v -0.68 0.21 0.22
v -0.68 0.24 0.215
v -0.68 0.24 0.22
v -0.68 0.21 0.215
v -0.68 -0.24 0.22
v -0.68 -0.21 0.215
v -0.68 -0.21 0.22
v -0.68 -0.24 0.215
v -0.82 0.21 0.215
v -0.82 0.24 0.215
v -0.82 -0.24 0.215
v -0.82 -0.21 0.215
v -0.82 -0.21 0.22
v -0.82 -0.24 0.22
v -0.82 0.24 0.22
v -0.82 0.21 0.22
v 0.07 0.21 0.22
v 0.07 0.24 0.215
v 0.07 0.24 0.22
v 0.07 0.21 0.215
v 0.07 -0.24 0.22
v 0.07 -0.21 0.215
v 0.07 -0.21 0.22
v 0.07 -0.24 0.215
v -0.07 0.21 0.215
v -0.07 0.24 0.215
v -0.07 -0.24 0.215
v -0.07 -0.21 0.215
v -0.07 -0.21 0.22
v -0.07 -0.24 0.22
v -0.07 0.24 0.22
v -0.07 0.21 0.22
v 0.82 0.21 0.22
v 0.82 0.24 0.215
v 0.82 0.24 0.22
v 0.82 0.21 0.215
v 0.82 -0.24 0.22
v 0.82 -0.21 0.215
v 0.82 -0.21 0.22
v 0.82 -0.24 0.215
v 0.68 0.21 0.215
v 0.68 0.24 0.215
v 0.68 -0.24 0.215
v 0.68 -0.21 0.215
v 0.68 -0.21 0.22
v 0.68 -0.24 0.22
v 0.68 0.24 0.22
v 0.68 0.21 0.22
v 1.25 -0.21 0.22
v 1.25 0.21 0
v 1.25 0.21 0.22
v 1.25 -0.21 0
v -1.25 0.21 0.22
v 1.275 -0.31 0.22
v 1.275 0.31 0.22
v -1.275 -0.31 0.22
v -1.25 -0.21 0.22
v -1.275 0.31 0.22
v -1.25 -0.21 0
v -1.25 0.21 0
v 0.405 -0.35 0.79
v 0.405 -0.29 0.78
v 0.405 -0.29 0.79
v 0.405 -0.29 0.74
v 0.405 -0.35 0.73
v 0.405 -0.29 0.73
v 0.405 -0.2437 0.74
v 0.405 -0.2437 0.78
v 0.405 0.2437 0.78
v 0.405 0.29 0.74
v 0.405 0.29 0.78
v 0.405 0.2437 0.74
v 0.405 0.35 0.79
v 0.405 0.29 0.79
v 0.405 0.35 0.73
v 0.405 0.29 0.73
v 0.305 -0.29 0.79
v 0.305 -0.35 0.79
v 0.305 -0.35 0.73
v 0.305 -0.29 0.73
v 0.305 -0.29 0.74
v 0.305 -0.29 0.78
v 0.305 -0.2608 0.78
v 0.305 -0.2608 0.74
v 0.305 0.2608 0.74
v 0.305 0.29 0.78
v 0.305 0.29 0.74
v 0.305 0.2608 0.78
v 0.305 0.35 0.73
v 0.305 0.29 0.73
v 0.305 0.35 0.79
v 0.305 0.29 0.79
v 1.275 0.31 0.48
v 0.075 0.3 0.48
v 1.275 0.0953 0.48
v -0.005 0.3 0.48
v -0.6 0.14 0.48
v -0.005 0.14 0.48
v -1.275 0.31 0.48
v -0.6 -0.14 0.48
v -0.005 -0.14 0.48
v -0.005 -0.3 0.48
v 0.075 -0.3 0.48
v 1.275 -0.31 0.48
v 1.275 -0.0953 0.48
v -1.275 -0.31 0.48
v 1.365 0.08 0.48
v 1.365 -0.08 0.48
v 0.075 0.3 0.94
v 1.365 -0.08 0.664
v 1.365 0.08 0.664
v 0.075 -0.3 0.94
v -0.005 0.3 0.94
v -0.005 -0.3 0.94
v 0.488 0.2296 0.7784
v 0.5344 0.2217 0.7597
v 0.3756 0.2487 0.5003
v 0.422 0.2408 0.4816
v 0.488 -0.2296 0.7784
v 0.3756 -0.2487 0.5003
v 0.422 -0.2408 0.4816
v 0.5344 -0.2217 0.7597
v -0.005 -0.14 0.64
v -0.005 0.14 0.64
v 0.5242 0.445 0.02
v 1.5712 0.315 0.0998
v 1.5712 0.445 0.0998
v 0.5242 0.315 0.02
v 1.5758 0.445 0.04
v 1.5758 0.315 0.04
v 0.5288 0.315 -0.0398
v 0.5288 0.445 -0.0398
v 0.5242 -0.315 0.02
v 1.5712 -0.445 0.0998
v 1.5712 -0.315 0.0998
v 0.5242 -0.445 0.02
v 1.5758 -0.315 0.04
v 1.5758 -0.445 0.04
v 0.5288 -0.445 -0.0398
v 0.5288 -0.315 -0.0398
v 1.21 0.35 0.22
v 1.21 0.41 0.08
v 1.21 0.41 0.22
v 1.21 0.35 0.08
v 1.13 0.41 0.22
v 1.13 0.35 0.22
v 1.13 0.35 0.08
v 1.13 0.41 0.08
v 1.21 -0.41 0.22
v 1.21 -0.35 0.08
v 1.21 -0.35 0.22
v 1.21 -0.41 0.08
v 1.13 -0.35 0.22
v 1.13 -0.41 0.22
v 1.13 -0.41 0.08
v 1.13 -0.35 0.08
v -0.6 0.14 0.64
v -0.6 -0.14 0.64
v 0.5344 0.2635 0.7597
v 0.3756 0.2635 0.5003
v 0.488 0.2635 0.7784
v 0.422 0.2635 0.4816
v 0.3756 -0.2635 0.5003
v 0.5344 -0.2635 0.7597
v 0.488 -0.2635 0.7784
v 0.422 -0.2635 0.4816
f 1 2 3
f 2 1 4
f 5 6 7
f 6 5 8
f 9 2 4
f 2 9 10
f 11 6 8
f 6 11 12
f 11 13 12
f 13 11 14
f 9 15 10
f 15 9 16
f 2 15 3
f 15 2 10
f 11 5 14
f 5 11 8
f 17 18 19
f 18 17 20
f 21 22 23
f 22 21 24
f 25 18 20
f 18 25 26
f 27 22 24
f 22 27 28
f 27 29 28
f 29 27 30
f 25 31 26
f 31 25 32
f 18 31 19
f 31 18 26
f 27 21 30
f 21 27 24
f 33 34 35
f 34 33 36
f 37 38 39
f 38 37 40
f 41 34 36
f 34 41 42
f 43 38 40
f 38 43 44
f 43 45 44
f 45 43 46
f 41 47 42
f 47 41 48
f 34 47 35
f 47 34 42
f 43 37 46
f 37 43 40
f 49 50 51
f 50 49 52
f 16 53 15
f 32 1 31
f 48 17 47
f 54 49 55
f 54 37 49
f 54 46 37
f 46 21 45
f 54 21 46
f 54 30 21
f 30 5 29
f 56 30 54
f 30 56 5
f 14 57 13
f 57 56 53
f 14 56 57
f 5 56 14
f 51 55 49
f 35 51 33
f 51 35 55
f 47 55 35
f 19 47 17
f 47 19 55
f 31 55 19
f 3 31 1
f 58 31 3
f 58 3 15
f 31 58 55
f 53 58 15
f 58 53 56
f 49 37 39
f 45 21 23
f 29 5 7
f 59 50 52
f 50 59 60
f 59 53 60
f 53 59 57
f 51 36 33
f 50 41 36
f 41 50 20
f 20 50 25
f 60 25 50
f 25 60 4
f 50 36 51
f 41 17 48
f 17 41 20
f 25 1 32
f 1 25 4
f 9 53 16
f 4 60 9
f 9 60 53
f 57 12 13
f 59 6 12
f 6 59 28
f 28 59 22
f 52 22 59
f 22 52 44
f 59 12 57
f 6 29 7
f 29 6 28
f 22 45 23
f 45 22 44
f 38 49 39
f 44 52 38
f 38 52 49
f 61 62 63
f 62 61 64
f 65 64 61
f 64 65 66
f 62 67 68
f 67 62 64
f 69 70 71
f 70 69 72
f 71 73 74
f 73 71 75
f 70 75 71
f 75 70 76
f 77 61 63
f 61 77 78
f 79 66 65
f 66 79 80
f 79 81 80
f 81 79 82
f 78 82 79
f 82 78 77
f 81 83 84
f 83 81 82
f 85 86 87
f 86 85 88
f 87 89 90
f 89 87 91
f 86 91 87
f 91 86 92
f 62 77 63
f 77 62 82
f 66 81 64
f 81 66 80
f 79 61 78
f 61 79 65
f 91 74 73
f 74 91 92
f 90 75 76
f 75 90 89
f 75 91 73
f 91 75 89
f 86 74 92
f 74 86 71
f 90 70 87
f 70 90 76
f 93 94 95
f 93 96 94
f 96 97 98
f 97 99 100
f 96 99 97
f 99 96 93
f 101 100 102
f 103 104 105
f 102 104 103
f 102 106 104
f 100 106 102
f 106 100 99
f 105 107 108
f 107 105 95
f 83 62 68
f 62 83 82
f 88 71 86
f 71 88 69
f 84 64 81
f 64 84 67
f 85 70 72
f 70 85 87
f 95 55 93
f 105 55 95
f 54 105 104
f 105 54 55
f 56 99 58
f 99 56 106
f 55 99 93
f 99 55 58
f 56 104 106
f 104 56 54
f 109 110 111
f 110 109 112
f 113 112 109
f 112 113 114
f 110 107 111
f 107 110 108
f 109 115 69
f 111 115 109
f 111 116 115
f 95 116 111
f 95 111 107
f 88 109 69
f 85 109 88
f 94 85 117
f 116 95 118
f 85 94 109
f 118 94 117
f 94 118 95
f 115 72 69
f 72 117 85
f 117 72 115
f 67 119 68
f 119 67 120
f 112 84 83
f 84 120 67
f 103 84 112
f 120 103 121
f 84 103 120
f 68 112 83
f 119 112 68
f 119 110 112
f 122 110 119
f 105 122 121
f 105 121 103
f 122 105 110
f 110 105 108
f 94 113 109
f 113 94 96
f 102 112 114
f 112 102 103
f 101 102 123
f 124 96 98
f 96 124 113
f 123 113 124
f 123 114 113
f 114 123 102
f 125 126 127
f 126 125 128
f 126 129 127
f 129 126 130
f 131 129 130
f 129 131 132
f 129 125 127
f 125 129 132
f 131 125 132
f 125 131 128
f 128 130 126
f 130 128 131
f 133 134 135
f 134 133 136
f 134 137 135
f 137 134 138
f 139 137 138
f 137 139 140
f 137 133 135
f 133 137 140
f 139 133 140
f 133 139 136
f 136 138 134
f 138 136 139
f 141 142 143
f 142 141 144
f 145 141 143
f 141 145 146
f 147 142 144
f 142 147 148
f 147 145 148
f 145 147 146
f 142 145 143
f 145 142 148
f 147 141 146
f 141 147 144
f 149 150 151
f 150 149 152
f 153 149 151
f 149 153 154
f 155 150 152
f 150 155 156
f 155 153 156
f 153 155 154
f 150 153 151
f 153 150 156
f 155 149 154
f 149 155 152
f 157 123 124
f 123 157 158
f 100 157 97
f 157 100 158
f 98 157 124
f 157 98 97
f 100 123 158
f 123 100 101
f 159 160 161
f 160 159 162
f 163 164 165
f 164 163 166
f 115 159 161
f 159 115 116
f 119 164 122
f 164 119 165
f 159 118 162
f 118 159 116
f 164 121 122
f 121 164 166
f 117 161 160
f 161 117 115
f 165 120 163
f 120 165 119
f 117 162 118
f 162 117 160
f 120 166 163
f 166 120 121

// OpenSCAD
// Snowmobile — ski-patrol rescue sled.
// A compact personal over-snow vehicle: single centred rear track, two
// front steering skis, a tapered hood over the engine, a seat, and
// handlebars. Much narrower and shorter than the snowcat.
//
// Real specs (Arctic Cat / Ski-Doo touring class):
//   length ~2.9 m  ·  width ~0.70 m  ·  height ~1.1 m to bar tops
//
// Body colours are near-white so the renderer's per-instance ColorTint
// controls the appearance cleanly: white tint = parked, red tint = active.
//
// Origin at the centre of the footprint on Z=0. +X is forward.
// Conventions, units, and axis docs: see models-src/README.md.

$fn = 8;

// ── Dimensions (metres) ───────────────────────────────────────────────────

// Rear track — single centred belt
track_l = 2.50;
track_w = 0.42;
track_h = 0.22;

// Chassis / tunnel that everything mounts to
chassis_l = 2.55;
chassis_w = 0.62;
chassis_h = 0.26;

// Hood — tapers from the firewall (where chassis meets engine bay) to nose tip
hood_l      = 1.20; // measured forward from the firewall
hood_w_back = 0.60; // width at the firewall (matches chassis width)
hood_w_nose = 0.16; // width at the nose tip
hood_h      = 0.46; // hood height above chassis top

// Front skis — two wide-set steering skis; their centres live fore of
// the chassis nose so the tips visibly extend forward.
ski_l        = 1.05;
ski_w        = 0.13;
ski_h        = 0.06;
ski_span     = 0.38;    // half-span: ski centreline to vehicle centreline
ski_tip_fwd  = 0.30;    // how far the ski tip extends ahead of the chassis nose

// Seat — raised saddle slightly rearward of the chassis centre
seat_l = 0.80;
seat_w = 0.28;
seat_h = 0.16;
seat_x = -0.20;

// Windshield — raked slab ahead of the handlebars
ws_h   = 0.30;
ws_thk = 0.05;
ws_rake = 22; // degrees forward from vertical

// Handlebars — T-bar mounted above the windshield
hbar_w    = 0.64;
hbar_thk  = 0.04;
hbar_stem = 0.28; // stem height above chassis top

// ── Derived positions ─────────────────────────────────────────────────────
chassis_front = chassis_l / 2;
chassis_back  = -chassis_l / 2;
firewall_x    = chassis_front - hood_l; // where the hood starts

z_chassis = track_h;
z_top     = z_chassis + chassis_h;

ski_x = chassis_front + ski_tip_fwd - ski_l / 2;

hbar_x = firewall_x + 0.28; // handlebars live above the firewall area

// ── Modules ───────────────────────────────────────────────────────────────

module track() {
    color("DimGray")
        translate([0, 0, track_h / 2])
            cube([track_l, track_w, track_h], center = true);
    // Three cross-cleats suggest the tread pattern.
    color([0.35, 0.35, 0.35])
        for (dx = [-0.75, 0, 0.75])
            translate([dx, 0, track_h + 0.01])
                cube([0.14, track_w + 0.06, 0.03], center = true);
}

module chassis() {
    color([0.93, 0.93, 0.95])
        translate([0, 0, z_chassis + chassis_h / 2])
            cube([chassis_l, chassis_w, chassis_h], center = true);
}

// Hood: a convex hull from the wide firewall section to the narrow nose tip,
// creating a smooth taper that reads clearly as a snowmobile's engine cover.
module hood() {
    color([0.90, 0.90, 0.92])
        hull() {
            // Nose tip — very narrow
            translate([chassis_front + 0.06, 0, z_top + hood_h * 0.20])
                cube([0.06, hood_w_nose, hood_h * 0.40], center = true);
            // Firewall — full width, full height
            translate([firewall_x - 0.04, 0, z_top + hood_h * 0.50])
                cube([0.08, hood_w_back, hood_h], center = true);
        }
}

// One front steering ski. `side` = +1 (right) or −1 (left).
module ski(side) {
    // Skis are horizontal but with a slight tip upward at the front.
    tip_rise = 0.08;
    color([0.84, 0.84, 0.88])
        translate([ski_x, side * ski_span, ski_h / 2])
            rotate([0, -atan(tip_rise / ski_l), 0])
                cube([ski_l, ski_w, ski_h], center = true);
}

// Ski leg strut from chassis underside down to the ski
module ski_strut(side) {
    strut_bot = ski_h + 0.02;
    strut_top = z_chassis;
    strut_h   = strut_top - strut_bot;
    color("Gray")
        translate([ski_x + 0.12, side * ski_span, strut_bot + strut_h / 2])
            cube([0.08, 0.06, strut_h], center = true);
}

module seat() {
    color("DarkGray")
        translate([seat_x, 0, z_top + seat_h / 2])
            cube([seat_l, seat_w, seat_h], center = true);
}

module windshield() {
    color([0.75, 0.90, 0.95])
        translate([hbar_x + 0.10, 0, z_top + ws_h / 2])
            rotate([0, ws_rake, 0])
                cube([ws_thk, chassis_w * 0.85, ws_h], center = true);
}

module handlebars() {
    bar_z = z_top + hbar_stem;
    // Vertical stem
    color("Gray")
        translate([hbar_x, 0, z_top + hbar_stem / 2])
            cube([hbar_thk, hbar_thk, hbar_stem], center = true);
    // Horizontal crossbar
    color("Gray")
        translate([hbar_x, 0, bar_z])
            cube([hbar_thk * 2.5, hbar_w, hbar_thk], center = true);
    // Grip ends
    for (side = [-1, +1])
        color([0.20, 0.20, 0.20])
            translate([hbar_x, side * hbar_w / 2, bar_z])
                cube([0.10, 0.06, hbar_thk * 1.5], center = true);
}

module snowmobile() {
    track();
    chassis();
    hood();
    ski(+1);
    ski(-1);
    ski_strut(+1);
    ski_strut(-1);
    seat();
    windshield();
    handlebars();
}

snowmobile();
